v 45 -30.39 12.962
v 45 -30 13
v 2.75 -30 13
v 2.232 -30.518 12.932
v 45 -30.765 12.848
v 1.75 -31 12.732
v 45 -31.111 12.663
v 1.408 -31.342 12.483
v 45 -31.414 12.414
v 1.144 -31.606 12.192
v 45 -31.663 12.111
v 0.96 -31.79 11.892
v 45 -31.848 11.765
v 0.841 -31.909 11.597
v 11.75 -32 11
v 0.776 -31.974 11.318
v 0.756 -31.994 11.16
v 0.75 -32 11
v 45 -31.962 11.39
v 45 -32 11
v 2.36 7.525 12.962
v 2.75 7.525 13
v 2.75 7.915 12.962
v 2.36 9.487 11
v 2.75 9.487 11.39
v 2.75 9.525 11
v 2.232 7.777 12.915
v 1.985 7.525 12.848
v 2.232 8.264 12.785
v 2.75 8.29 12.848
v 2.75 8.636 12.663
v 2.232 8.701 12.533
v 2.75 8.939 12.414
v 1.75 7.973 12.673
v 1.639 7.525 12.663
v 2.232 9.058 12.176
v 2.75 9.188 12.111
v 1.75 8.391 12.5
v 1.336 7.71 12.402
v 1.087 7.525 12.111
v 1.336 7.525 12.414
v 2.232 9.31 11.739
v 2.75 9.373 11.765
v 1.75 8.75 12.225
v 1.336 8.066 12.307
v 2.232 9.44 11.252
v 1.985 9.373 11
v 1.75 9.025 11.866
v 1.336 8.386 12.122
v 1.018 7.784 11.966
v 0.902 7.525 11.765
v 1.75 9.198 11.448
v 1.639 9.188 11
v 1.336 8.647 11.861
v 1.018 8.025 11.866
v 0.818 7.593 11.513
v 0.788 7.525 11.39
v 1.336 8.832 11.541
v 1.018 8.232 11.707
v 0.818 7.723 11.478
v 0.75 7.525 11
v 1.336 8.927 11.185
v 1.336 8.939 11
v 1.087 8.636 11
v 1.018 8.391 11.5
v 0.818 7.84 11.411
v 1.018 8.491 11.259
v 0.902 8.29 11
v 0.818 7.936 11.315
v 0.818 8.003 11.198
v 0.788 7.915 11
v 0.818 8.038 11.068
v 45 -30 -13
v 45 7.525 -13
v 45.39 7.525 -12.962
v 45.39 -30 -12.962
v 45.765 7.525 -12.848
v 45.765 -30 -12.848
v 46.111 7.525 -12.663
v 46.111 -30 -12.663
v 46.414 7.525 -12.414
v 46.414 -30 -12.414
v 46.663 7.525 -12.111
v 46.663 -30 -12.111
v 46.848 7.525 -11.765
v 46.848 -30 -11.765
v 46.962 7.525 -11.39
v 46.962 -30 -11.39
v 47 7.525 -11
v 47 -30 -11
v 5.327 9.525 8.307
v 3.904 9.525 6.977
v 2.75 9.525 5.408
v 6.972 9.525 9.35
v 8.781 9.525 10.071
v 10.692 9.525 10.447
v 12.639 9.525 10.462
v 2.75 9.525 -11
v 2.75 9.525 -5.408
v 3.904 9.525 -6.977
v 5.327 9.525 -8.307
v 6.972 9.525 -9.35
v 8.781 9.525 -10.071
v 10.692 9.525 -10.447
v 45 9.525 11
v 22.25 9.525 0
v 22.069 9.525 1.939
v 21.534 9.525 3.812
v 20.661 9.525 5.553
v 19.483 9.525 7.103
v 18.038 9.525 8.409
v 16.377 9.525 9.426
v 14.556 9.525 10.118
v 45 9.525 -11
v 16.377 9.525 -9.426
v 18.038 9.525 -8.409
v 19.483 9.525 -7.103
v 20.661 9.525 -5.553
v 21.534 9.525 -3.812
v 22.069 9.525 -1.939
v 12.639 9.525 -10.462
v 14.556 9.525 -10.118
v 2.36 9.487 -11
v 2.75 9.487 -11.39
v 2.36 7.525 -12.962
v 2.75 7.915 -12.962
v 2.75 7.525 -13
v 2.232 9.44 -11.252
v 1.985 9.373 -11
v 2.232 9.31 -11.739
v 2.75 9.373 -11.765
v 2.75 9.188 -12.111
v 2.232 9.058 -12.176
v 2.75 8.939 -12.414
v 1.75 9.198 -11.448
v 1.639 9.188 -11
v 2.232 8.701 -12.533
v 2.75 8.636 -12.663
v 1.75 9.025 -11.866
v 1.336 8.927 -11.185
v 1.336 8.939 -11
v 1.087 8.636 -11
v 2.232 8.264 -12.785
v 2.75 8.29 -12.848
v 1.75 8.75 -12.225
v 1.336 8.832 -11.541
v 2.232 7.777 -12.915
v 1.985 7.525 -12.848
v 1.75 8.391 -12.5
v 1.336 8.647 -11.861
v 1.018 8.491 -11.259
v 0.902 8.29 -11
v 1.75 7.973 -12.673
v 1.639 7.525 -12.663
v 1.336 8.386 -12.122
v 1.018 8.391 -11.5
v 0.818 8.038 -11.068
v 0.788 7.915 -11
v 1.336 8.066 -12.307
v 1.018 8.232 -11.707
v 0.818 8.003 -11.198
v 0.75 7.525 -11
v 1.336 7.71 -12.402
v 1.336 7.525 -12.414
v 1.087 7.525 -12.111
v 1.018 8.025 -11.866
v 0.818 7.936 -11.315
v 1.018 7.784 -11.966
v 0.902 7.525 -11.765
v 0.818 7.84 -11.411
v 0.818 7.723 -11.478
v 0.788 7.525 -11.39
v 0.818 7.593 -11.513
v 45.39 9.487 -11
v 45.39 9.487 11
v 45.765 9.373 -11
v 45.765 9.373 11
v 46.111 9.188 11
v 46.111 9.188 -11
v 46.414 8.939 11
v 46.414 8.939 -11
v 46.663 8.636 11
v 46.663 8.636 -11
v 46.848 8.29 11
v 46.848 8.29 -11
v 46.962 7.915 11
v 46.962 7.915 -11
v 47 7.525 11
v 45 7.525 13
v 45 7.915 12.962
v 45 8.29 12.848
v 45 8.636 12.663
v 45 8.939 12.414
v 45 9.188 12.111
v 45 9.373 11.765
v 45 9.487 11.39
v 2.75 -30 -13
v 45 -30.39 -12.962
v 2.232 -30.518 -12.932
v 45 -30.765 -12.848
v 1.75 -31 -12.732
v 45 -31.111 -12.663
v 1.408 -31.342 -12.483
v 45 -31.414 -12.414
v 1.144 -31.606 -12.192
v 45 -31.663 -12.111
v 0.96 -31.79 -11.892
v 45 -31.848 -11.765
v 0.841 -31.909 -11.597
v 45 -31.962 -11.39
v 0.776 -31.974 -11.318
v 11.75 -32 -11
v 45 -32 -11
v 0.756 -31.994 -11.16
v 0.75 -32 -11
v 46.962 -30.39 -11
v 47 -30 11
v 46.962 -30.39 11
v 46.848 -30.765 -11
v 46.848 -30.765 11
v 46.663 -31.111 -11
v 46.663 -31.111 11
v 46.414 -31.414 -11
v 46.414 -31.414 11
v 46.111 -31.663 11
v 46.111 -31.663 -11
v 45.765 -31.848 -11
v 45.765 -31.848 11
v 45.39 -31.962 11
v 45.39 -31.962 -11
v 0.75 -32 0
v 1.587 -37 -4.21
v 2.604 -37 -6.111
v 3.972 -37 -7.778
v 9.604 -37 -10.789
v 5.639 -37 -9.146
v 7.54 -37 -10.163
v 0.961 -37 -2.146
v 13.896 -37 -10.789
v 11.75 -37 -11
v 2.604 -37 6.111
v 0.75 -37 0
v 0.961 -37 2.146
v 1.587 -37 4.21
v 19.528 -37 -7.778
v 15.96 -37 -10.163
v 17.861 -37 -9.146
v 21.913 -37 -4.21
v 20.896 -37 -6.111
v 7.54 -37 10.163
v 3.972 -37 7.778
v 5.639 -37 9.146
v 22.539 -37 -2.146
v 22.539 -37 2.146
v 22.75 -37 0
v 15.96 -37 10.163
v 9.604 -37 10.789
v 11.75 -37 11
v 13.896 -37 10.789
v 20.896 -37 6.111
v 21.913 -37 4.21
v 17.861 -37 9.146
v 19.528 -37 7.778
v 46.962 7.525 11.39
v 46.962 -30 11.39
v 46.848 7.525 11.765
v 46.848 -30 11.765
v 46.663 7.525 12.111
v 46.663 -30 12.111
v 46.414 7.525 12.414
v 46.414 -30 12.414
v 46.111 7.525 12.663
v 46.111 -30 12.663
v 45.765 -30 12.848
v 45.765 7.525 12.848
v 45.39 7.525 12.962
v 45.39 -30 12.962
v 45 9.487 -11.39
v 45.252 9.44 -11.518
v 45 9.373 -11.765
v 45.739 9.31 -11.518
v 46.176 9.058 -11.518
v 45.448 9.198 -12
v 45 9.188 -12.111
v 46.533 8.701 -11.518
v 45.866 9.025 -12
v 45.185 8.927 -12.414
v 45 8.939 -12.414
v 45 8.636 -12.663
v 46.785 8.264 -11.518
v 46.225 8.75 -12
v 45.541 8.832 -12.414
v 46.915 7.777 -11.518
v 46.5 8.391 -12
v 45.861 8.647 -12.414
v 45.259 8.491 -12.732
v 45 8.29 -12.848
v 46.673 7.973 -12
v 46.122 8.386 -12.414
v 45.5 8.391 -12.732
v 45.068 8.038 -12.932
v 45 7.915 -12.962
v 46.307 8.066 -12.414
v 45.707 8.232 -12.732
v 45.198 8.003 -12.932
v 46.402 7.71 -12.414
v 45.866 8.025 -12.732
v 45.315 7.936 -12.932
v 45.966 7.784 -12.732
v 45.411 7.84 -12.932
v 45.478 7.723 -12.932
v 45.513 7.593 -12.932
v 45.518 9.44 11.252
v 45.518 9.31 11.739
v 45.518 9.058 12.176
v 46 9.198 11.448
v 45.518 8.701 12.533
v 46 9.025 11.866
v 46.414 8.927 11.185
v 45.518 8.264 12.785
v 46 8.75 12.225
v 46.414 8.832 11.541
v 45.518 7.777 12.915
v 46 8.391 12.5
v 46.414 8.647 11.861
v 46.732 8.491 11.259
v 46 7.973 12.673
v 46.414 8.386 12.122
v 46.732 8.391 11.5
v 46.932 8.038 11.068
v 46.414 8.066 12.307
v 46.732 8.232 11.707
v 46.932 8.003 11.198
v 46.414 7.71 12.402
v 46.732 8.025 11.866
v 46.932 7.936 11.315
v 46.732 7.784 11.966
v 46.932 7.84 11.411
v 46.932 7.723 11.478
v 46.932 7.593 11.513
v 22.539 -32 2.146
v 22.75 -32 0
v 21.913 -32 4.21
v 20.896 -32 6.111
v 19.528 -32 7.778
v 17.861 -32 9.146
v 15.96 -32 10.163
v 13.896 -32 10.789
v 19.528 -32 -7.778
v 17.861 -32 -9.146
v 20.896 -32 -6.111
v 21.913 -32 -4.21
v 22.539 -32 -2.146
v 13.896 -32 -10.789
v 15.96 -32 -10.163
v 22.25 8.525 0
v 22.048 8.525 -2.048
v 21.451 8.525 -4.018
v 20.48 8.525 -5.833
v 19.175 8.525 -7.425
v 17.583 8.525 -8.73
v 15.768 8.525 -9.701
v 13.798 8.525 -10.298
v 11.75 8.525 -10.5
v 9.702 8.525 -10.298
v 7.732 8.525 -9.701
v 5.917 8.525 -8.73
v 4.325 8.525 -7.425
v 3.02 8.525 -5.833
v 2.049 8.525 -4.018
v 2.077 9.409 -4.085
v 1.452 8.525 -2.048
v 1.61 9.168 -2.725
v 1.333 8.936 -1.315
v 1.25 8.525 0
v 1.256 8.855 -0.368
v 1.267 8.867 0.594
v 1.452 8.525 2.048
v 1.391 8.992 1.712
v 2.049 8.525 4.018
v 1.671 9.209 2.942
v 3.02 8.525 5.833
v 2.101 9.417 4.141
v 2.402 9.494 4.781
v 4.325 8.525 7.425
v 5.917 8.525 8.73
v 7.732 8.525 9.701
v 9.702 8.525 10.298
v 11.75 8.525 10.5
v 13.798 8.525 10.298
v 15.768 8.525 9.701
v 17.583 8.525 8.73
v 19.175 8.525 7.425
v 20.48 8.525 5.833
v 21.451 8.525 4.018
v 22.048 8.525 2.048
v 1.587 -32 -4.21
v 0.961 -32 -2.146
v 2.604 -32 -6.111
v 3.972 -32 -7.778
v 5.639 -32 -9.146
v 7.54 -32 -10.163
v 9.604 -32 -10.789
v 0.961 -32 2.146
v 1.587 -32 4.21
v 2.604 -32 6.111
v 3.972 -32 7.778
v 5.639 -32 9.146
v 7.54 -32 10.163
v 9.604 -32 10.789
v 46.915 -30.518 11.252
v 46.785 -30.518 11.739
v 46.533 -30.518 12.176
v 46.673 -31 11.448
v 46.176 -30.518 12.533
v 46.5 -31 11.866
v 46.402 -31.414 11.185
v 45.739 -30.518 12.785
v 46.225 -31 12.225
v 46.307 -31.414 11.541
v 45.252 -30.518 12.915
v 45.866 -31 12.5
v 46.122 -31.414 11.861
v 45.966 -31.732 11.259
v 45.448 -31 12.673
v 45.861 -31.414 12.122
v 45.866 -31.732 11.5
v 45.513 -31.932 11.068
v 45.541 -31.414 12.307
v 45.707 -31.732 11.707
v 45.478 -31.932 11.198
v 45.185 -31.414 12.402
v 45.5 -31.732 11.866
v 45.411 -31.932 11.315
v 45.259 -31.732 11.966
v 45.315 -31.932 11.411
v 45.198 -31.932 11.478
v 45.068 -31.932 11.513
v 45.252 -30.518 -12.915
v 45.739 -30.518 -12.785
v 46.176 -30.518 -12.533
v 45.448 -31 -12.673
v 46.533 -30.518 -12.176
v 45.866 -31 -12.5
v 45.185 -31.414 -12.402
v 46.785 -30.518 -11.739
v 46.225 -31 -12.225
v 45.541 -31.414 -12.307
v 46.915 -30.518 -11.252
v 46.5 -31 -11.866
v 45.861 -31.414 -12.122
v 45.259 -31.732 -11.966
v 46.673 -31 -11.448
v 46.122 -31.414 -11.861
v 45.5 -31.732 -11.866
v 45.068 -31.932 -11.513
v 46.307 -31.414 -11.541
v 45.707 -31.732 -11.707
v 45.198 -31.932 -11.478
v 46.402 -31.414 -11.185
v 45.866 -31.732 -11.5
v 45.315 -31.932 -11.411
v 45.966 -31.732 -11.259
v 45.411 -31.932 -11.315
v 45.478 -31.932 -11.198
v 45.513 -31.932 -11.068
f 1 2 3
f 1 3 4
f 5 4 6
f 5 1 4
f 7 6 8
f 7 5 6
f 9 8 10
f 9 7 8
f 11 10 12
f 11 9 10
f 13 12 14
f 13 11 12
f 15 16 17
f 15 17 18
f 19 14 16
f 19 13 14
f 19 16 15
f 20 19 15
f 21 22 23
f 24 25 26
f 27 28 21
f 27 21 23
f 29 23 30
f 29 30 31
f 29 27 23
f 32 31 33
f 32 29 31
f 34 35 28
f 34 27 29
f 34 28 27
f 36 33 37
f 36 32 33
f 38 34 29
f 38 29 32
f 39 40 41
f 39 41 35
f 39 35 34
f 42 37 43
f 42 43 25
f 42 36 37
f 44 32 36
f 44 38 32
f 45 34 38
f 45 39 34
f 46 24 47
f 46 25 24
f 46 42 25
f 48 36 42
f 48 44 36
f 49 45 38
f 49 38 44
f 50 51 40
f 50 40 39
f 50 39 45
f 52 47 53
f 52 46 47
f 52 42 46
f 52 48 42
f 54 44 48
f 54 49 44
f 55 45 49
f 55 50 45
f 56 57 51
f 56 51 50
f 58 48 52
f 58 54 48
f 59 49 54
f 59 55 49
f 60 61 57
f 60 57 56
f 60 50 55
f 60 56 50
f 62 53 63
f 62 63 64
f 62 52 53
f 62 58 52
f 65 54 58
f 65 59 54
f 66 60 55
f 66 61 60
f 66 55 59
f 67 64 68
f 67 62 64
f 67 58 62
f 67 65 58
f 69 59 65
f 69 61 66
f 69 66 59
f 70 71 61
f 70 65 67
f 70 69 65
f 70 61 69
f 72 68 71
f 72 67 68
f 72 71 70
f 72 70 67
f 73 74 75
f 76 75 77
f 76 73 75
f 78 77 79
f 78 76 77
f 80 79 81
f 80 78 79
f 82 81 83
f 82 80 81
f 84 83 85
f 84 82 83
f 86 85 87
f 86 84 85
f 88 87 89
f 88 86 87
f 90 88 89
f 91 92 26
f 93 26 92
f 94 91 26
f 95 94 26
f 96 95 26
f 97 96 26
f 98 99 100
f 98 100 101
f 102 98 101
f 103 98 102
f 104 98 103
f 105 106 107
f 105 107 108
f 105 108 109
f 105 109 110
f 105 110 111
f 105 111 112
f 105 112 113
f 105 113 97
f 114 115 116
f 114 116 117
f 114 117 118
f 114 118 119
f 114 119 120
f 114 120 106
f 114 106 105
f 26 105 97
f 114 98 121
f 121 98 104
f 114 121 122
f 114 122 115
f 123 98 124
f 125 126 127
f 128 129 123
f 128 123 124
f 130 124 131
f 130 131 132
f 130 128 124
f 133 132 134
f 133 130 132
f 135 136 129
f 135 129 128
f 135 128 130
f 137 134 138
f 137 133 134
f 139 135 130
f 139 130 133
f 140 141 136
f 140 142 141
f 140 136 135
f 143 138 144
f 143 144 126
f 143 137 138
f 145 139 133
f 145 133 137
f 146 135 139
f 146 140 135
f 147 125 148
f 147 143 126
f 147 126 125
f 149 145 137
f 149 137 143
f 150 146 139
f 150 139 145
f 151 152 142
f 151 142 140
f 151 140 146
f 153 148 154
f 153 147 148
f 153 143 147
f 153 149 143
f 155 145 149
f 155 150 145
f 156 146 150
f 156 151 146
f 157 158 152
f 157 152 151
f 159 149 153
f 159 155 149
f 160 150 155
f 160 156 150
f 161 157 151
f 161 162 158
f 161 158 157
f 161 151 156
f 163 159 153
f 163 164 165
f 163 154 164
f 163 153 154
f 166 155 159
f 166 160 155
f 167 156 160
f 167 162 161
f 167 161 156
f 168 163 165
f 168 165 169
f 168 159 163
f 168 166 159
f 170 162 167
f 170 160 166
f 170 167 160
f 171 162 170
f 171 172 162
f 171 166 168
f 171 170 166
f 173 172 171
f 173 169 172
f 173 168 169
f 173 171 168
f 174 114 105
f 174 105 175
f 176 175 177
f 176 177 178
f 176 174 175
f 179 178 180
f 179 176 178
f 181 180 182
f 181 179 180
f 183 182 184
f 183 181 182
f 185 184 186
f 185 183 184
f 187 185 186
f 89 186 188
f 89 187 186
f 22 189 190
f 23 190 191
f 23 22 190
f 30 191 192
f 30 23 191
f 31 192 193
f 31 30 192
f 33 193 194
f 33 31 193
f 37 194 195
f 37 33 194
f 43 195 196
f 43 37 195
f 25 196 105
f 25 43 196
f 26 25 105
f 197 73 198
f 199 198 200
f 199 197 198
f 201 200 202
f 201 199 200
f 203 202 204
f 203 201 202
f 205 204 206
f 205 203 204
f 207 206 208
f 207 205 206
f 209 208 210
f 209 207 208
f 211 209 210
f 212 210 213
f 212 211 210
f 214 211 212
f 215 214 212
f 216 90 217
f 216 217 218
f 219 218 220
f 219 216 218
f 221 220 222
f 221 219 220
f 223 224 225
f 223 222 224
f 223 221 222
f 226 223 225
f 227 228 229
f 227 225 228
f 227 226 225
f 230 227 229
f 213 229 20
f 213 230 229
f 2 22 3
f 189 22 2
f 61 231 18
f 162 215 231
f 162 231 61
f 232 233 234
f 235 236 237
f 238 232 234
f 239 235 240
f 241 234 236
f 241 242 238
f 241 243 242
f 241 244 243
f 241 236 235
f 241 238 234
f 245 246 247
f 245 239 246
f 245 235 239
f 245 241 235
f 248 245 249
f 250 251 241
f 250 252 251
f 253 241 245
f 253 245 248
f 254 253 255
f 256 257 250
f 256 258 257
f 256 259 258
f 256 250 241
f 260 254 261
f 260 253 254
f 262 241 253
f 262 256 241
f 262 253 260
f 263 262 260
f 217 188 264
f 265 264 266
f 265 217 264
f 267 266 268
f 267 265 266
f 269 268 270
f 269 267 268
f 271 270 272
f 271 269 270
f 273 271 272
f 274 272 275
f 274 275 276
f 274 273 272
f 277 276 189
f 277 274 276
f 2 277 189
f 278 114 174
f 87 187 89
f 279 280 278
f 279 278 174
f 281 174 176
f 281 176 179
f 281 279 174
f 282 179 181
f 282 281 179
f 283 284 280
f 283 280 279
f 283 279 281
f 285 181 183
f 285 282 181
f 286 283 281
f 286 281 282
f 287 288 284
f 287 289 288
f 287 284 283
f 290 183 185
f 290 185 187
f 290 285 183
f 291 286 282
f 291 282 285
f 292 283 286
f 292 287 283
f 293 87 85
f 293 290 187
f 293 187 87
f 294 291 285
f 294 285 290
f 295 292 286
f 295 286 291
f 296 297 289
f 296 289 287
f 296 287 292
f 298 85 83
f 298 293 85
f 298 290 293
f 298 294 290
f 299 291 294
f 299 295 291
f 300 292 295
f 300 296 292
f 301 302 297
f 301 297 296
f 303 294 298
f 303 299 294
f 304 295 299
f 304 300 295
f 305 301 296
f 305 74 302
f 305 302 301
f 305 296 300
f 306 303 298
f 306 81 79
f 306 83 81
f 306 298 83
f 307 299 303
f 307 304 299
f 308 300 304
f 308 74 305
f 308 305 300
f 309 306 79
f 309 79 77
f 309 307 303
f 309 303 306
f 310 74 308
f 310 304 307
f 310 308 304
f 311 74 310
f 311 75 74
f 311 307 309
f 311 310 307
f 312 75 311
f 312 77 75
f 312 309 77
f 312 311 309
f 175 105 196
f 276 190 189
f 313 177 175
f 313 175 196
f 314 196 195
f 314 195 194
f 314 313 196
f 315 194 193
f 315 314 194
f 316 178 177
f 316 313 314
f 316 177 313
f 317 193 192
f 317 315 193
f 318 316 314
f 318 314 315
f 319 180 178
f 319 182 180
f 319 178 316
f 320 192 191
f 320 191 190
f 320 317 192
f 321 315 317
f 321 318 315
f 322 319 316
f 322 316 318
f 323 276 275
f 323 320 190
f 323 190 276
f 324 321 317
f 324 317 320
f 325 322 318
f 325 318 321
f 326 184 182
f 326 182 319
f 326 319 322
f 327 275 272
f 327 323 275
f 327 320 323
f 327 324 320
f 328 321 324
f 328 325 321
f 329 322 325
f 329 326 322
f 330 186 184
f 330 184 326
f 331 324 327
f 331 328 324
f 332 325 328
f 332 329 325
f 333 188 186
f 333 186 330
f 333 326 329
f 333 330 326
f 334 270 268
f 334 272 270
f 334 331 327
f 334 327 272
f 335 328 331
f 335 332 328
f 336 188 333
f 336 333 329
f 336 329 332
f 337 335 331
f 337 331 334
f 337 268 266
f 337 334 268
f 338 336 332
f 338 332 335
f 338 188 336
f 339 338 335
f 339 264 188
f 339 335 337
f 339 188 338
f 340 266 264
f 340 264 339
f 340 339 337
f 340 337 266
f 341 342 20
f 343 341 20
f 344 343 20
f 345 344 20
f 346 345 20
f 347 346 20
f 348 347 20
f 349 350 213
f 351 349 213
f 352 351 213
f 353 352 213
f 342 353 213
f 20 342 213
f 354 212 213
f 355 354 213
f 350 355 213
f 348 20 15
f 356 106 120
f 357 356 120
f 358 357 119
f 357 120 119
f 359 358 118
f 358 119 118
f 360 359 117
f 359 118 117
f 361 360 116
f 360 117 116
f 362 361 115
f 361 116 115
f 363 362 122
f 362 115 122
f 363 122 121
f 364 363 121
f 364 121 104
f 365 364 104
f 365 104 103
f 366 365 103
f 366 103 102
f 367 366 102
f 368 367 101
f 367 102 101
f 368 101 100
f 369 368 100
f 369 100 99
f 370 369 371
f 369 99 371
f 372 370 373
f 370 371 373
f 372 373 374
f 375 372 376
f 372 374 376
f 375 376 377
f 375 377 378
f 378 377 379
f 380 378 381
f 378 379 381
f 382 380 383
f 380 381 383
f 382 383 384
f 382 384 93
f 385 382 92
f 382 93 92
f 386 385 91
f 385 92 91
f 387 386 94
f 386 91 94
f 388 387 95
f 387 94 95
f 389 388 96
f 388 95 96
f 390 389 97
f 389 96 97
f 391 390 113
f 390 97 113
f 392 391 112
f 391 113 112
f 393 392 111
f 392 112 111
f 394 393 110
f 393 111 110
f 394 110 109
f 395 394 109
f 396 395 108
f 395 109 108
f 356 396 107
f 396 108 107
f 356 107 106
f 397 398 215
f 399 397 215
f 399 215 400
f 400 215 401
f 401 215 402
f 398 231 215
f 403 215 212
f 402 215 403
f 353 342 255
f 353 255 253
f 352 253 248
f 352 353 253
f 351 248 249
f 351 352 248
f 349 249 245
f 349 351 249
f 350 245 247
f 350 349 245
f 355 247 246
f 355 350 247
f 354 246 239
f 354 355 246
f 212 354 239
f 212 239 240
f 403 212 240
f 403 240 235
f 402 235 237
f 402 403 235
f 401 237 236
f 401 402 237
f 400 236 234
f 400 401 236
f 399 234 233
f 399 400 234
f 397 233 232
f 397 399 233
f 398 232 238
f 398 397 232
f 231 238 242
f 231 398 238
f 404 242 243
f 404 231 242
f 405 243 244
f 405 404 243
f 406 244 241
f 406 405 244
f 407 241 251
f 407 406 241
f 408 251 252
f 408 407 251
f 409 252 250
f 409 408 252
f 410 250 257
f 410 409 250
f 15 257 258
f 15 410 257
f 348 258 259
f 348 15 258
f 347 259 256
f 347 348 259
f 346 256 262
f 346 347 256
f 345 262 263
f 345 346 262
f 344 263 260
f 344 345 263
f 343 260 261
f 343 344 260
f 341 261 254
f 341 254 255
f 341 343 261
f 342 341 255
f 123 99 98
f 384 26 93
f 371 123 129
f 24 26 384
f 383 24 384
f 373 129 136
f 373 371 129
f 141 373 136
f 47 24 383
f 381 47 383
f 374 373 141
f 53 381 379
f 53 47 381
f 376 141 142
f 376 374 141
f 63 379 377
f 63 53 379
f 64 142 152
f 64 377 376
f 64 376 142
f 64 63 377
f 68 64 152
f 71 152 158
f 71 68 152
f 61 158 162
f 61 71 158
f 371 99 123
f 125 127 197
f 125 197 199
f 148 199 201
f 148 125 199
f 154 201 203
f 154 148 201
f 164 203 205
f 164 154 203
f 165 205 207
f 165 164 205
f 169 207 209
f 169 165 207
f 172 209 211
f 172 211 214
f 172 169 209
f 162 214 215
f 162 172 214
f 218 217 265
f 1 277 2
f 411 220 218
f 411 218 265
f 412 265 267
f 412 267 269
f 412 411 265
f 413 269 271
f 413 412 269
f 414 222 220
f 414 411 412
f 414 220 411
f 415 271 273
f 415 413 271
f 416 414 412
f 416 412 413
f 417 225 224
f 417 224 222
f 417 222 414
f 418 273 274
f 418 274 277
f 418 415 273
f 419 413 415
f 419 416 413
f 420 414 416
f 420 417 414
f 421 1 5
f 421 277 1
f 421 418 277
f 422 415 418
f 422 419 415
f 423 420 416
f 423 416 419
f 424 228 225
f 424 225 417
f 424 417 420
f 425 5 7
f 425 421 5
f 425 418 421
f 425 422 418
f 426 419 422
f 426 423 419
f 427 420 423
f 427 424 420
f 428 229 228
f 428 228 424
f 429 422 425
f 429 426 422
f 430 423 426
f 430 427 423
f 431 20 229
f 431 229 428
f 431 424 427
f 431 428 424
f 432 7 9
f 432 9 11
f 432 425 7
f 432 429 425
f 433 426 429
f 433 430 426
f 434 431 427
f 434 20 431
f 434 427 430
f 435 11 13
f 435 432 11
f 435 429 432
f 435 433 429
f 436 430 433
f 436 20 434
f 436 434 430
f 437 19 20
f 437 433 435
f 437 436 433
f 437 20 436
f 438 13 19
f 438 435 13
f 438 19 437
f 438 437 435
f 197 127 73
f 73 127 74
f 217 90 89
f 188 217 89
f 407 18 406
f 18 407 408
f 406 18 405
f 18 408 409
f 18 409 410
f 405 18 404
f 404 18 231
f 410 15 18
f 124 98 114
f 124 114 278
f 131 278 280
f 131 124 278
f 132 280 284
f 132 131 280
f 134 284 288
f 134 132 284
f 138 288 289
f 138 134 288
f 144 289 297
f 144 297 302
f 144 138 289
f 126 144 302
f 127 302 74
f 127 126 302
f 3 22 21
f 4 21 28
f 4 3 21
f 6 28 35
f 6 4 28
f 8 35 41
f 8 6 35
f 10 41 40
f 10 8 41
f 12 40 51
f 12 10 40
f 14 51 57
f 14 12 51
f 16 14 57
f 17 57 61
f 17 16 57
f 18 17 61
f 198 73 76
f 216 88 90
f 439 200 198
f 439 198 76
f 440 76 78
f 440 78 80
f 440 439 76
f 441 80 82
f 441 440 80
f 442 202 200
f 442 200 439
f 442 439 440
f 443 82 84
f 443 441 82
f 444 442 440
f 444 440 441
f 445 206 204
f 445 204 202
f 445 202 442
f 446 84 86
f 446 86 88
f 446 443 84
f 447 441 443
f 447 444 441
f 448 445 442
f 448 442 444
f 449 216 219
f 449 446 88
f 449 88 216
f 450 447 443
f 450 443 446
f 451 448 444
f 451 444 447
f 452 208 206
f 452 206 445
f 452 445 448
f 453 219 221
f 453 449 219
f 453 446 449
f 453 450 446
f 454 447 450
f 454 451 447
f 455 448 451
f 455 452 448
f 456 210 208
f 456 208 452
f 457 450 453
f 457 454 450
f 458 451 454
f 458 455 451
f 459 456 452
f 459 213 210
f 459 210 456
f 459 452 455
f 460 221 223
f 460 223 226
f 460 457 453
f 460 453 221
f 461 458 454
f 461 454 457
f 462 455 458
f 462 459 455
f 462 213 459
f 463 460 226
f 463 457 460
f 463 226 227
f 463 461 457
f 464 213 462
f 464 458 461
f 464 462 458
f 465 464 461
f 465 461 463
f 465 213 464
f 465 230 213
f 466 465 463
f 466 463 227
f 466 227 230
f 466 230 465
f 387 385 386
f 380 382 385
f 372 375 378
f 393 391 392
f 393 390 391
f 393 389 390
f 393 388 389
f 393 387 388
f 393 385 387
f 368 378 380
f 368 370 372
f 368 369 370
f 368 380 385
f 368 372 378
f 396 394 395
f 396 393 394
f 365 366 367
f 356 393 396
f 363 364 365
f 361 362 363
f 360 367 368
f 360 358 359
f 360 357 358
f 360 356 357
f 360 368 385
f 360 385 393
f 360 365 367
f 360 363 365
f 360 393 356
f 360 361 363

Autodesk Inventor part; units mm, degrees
ref_plane "YZ Plane" through (0, 0, 0) normal (1, 0, 0) x (0, 1, 0)
ref_plane "XZ Plane" through (0, 0, 0) normal (0, 1, 0) x (-1, 0, 0)
ref_plane "XY Plane" through (0, 0, 0) normal (0, 0, 1) x (1, 0, 0)
sketch "Sketch1" plane through (0, 0, 0) normal (0, 0, 1) x (1, 0, 0)
  line L0 (11.75, -37) -> (22.75, -37)
  line L1 (11.75, -37) -> (0.75, -37)
  line L2 (0.75, -37) -> (0.75, -32)
  line L3 (0.75, -32) -> (22.75, -32)
  line L4 (22.75, -32) -> (22.75, -37)
  line L5 (0.75, -32) -> (0.75, 6.35)
  line L6 (22.75, -32) -> (47, -32)
  line L7 (47, -32) -> (47, 6.35)
  line L8 (0.75, 6.35) -> (0.75, 9.525)
  line L9 (0.75, 9.525) -> (47, 9.525)
  line L10 (47, 9.525) -> (47, 6.35)
  point P0 (0, 0)
  dimension "d2" = 11
  dimension "d3" = 11
  dimension "d4" = 5
extrude "Extrusion1" add sketch "Sketch1" along normal mid plane 26 contours L3 L5 L8 L9 L10 L7 L6
sketch "Sketch2" plane through (0.75, 9.525, 13) normal (0, 1, 0) x (1, 0, 0)
  line L0 (0, 26) -> (0, 0) projected
  line L1 (0, 13) -> (11, 13)
  circle A0 centre (11, 13) radius 10.5
  point P0 (-0.75, 13)
  dimension "d7" = 11
  dimension "d8" = 21
extrude "Extrusion2" cut sketch "Sketch2" against normal blind 1
sketch "Sketch3" plane through (0.75, -32, 13) normal (0, -1, 0) x (1, 0, 0)
  line L0 (0, -26) -> (0, 0) projected
  line L1 (46.25, -26) -> (46.25, 0) projected
  line L2 (0, -13) -> (11, -13)
  circle A0 centre (11, -13) radius 11
  point P0 (-0.75, -13)
  dimension "d11" = 11
  dimension "d12" = 22
extrude "Extrusion3" add sketch "Sketch3" along normal blind 5
fillet "Fillet1" radius 2 11 edges at (47, -11.2375, 13) (47, -32, 0) (47, -11.2375, -13) (47, 9.525, 0) (23.875, 9.525, 13) (23.875, -32, 13) (23.875, -32, -13) (0.75, -11.2375, 13) (0.75, 9.525, 0) (0.75, -11.2375, -13) (23.875, 9.525, -13)
properties part number "Wrist2"
